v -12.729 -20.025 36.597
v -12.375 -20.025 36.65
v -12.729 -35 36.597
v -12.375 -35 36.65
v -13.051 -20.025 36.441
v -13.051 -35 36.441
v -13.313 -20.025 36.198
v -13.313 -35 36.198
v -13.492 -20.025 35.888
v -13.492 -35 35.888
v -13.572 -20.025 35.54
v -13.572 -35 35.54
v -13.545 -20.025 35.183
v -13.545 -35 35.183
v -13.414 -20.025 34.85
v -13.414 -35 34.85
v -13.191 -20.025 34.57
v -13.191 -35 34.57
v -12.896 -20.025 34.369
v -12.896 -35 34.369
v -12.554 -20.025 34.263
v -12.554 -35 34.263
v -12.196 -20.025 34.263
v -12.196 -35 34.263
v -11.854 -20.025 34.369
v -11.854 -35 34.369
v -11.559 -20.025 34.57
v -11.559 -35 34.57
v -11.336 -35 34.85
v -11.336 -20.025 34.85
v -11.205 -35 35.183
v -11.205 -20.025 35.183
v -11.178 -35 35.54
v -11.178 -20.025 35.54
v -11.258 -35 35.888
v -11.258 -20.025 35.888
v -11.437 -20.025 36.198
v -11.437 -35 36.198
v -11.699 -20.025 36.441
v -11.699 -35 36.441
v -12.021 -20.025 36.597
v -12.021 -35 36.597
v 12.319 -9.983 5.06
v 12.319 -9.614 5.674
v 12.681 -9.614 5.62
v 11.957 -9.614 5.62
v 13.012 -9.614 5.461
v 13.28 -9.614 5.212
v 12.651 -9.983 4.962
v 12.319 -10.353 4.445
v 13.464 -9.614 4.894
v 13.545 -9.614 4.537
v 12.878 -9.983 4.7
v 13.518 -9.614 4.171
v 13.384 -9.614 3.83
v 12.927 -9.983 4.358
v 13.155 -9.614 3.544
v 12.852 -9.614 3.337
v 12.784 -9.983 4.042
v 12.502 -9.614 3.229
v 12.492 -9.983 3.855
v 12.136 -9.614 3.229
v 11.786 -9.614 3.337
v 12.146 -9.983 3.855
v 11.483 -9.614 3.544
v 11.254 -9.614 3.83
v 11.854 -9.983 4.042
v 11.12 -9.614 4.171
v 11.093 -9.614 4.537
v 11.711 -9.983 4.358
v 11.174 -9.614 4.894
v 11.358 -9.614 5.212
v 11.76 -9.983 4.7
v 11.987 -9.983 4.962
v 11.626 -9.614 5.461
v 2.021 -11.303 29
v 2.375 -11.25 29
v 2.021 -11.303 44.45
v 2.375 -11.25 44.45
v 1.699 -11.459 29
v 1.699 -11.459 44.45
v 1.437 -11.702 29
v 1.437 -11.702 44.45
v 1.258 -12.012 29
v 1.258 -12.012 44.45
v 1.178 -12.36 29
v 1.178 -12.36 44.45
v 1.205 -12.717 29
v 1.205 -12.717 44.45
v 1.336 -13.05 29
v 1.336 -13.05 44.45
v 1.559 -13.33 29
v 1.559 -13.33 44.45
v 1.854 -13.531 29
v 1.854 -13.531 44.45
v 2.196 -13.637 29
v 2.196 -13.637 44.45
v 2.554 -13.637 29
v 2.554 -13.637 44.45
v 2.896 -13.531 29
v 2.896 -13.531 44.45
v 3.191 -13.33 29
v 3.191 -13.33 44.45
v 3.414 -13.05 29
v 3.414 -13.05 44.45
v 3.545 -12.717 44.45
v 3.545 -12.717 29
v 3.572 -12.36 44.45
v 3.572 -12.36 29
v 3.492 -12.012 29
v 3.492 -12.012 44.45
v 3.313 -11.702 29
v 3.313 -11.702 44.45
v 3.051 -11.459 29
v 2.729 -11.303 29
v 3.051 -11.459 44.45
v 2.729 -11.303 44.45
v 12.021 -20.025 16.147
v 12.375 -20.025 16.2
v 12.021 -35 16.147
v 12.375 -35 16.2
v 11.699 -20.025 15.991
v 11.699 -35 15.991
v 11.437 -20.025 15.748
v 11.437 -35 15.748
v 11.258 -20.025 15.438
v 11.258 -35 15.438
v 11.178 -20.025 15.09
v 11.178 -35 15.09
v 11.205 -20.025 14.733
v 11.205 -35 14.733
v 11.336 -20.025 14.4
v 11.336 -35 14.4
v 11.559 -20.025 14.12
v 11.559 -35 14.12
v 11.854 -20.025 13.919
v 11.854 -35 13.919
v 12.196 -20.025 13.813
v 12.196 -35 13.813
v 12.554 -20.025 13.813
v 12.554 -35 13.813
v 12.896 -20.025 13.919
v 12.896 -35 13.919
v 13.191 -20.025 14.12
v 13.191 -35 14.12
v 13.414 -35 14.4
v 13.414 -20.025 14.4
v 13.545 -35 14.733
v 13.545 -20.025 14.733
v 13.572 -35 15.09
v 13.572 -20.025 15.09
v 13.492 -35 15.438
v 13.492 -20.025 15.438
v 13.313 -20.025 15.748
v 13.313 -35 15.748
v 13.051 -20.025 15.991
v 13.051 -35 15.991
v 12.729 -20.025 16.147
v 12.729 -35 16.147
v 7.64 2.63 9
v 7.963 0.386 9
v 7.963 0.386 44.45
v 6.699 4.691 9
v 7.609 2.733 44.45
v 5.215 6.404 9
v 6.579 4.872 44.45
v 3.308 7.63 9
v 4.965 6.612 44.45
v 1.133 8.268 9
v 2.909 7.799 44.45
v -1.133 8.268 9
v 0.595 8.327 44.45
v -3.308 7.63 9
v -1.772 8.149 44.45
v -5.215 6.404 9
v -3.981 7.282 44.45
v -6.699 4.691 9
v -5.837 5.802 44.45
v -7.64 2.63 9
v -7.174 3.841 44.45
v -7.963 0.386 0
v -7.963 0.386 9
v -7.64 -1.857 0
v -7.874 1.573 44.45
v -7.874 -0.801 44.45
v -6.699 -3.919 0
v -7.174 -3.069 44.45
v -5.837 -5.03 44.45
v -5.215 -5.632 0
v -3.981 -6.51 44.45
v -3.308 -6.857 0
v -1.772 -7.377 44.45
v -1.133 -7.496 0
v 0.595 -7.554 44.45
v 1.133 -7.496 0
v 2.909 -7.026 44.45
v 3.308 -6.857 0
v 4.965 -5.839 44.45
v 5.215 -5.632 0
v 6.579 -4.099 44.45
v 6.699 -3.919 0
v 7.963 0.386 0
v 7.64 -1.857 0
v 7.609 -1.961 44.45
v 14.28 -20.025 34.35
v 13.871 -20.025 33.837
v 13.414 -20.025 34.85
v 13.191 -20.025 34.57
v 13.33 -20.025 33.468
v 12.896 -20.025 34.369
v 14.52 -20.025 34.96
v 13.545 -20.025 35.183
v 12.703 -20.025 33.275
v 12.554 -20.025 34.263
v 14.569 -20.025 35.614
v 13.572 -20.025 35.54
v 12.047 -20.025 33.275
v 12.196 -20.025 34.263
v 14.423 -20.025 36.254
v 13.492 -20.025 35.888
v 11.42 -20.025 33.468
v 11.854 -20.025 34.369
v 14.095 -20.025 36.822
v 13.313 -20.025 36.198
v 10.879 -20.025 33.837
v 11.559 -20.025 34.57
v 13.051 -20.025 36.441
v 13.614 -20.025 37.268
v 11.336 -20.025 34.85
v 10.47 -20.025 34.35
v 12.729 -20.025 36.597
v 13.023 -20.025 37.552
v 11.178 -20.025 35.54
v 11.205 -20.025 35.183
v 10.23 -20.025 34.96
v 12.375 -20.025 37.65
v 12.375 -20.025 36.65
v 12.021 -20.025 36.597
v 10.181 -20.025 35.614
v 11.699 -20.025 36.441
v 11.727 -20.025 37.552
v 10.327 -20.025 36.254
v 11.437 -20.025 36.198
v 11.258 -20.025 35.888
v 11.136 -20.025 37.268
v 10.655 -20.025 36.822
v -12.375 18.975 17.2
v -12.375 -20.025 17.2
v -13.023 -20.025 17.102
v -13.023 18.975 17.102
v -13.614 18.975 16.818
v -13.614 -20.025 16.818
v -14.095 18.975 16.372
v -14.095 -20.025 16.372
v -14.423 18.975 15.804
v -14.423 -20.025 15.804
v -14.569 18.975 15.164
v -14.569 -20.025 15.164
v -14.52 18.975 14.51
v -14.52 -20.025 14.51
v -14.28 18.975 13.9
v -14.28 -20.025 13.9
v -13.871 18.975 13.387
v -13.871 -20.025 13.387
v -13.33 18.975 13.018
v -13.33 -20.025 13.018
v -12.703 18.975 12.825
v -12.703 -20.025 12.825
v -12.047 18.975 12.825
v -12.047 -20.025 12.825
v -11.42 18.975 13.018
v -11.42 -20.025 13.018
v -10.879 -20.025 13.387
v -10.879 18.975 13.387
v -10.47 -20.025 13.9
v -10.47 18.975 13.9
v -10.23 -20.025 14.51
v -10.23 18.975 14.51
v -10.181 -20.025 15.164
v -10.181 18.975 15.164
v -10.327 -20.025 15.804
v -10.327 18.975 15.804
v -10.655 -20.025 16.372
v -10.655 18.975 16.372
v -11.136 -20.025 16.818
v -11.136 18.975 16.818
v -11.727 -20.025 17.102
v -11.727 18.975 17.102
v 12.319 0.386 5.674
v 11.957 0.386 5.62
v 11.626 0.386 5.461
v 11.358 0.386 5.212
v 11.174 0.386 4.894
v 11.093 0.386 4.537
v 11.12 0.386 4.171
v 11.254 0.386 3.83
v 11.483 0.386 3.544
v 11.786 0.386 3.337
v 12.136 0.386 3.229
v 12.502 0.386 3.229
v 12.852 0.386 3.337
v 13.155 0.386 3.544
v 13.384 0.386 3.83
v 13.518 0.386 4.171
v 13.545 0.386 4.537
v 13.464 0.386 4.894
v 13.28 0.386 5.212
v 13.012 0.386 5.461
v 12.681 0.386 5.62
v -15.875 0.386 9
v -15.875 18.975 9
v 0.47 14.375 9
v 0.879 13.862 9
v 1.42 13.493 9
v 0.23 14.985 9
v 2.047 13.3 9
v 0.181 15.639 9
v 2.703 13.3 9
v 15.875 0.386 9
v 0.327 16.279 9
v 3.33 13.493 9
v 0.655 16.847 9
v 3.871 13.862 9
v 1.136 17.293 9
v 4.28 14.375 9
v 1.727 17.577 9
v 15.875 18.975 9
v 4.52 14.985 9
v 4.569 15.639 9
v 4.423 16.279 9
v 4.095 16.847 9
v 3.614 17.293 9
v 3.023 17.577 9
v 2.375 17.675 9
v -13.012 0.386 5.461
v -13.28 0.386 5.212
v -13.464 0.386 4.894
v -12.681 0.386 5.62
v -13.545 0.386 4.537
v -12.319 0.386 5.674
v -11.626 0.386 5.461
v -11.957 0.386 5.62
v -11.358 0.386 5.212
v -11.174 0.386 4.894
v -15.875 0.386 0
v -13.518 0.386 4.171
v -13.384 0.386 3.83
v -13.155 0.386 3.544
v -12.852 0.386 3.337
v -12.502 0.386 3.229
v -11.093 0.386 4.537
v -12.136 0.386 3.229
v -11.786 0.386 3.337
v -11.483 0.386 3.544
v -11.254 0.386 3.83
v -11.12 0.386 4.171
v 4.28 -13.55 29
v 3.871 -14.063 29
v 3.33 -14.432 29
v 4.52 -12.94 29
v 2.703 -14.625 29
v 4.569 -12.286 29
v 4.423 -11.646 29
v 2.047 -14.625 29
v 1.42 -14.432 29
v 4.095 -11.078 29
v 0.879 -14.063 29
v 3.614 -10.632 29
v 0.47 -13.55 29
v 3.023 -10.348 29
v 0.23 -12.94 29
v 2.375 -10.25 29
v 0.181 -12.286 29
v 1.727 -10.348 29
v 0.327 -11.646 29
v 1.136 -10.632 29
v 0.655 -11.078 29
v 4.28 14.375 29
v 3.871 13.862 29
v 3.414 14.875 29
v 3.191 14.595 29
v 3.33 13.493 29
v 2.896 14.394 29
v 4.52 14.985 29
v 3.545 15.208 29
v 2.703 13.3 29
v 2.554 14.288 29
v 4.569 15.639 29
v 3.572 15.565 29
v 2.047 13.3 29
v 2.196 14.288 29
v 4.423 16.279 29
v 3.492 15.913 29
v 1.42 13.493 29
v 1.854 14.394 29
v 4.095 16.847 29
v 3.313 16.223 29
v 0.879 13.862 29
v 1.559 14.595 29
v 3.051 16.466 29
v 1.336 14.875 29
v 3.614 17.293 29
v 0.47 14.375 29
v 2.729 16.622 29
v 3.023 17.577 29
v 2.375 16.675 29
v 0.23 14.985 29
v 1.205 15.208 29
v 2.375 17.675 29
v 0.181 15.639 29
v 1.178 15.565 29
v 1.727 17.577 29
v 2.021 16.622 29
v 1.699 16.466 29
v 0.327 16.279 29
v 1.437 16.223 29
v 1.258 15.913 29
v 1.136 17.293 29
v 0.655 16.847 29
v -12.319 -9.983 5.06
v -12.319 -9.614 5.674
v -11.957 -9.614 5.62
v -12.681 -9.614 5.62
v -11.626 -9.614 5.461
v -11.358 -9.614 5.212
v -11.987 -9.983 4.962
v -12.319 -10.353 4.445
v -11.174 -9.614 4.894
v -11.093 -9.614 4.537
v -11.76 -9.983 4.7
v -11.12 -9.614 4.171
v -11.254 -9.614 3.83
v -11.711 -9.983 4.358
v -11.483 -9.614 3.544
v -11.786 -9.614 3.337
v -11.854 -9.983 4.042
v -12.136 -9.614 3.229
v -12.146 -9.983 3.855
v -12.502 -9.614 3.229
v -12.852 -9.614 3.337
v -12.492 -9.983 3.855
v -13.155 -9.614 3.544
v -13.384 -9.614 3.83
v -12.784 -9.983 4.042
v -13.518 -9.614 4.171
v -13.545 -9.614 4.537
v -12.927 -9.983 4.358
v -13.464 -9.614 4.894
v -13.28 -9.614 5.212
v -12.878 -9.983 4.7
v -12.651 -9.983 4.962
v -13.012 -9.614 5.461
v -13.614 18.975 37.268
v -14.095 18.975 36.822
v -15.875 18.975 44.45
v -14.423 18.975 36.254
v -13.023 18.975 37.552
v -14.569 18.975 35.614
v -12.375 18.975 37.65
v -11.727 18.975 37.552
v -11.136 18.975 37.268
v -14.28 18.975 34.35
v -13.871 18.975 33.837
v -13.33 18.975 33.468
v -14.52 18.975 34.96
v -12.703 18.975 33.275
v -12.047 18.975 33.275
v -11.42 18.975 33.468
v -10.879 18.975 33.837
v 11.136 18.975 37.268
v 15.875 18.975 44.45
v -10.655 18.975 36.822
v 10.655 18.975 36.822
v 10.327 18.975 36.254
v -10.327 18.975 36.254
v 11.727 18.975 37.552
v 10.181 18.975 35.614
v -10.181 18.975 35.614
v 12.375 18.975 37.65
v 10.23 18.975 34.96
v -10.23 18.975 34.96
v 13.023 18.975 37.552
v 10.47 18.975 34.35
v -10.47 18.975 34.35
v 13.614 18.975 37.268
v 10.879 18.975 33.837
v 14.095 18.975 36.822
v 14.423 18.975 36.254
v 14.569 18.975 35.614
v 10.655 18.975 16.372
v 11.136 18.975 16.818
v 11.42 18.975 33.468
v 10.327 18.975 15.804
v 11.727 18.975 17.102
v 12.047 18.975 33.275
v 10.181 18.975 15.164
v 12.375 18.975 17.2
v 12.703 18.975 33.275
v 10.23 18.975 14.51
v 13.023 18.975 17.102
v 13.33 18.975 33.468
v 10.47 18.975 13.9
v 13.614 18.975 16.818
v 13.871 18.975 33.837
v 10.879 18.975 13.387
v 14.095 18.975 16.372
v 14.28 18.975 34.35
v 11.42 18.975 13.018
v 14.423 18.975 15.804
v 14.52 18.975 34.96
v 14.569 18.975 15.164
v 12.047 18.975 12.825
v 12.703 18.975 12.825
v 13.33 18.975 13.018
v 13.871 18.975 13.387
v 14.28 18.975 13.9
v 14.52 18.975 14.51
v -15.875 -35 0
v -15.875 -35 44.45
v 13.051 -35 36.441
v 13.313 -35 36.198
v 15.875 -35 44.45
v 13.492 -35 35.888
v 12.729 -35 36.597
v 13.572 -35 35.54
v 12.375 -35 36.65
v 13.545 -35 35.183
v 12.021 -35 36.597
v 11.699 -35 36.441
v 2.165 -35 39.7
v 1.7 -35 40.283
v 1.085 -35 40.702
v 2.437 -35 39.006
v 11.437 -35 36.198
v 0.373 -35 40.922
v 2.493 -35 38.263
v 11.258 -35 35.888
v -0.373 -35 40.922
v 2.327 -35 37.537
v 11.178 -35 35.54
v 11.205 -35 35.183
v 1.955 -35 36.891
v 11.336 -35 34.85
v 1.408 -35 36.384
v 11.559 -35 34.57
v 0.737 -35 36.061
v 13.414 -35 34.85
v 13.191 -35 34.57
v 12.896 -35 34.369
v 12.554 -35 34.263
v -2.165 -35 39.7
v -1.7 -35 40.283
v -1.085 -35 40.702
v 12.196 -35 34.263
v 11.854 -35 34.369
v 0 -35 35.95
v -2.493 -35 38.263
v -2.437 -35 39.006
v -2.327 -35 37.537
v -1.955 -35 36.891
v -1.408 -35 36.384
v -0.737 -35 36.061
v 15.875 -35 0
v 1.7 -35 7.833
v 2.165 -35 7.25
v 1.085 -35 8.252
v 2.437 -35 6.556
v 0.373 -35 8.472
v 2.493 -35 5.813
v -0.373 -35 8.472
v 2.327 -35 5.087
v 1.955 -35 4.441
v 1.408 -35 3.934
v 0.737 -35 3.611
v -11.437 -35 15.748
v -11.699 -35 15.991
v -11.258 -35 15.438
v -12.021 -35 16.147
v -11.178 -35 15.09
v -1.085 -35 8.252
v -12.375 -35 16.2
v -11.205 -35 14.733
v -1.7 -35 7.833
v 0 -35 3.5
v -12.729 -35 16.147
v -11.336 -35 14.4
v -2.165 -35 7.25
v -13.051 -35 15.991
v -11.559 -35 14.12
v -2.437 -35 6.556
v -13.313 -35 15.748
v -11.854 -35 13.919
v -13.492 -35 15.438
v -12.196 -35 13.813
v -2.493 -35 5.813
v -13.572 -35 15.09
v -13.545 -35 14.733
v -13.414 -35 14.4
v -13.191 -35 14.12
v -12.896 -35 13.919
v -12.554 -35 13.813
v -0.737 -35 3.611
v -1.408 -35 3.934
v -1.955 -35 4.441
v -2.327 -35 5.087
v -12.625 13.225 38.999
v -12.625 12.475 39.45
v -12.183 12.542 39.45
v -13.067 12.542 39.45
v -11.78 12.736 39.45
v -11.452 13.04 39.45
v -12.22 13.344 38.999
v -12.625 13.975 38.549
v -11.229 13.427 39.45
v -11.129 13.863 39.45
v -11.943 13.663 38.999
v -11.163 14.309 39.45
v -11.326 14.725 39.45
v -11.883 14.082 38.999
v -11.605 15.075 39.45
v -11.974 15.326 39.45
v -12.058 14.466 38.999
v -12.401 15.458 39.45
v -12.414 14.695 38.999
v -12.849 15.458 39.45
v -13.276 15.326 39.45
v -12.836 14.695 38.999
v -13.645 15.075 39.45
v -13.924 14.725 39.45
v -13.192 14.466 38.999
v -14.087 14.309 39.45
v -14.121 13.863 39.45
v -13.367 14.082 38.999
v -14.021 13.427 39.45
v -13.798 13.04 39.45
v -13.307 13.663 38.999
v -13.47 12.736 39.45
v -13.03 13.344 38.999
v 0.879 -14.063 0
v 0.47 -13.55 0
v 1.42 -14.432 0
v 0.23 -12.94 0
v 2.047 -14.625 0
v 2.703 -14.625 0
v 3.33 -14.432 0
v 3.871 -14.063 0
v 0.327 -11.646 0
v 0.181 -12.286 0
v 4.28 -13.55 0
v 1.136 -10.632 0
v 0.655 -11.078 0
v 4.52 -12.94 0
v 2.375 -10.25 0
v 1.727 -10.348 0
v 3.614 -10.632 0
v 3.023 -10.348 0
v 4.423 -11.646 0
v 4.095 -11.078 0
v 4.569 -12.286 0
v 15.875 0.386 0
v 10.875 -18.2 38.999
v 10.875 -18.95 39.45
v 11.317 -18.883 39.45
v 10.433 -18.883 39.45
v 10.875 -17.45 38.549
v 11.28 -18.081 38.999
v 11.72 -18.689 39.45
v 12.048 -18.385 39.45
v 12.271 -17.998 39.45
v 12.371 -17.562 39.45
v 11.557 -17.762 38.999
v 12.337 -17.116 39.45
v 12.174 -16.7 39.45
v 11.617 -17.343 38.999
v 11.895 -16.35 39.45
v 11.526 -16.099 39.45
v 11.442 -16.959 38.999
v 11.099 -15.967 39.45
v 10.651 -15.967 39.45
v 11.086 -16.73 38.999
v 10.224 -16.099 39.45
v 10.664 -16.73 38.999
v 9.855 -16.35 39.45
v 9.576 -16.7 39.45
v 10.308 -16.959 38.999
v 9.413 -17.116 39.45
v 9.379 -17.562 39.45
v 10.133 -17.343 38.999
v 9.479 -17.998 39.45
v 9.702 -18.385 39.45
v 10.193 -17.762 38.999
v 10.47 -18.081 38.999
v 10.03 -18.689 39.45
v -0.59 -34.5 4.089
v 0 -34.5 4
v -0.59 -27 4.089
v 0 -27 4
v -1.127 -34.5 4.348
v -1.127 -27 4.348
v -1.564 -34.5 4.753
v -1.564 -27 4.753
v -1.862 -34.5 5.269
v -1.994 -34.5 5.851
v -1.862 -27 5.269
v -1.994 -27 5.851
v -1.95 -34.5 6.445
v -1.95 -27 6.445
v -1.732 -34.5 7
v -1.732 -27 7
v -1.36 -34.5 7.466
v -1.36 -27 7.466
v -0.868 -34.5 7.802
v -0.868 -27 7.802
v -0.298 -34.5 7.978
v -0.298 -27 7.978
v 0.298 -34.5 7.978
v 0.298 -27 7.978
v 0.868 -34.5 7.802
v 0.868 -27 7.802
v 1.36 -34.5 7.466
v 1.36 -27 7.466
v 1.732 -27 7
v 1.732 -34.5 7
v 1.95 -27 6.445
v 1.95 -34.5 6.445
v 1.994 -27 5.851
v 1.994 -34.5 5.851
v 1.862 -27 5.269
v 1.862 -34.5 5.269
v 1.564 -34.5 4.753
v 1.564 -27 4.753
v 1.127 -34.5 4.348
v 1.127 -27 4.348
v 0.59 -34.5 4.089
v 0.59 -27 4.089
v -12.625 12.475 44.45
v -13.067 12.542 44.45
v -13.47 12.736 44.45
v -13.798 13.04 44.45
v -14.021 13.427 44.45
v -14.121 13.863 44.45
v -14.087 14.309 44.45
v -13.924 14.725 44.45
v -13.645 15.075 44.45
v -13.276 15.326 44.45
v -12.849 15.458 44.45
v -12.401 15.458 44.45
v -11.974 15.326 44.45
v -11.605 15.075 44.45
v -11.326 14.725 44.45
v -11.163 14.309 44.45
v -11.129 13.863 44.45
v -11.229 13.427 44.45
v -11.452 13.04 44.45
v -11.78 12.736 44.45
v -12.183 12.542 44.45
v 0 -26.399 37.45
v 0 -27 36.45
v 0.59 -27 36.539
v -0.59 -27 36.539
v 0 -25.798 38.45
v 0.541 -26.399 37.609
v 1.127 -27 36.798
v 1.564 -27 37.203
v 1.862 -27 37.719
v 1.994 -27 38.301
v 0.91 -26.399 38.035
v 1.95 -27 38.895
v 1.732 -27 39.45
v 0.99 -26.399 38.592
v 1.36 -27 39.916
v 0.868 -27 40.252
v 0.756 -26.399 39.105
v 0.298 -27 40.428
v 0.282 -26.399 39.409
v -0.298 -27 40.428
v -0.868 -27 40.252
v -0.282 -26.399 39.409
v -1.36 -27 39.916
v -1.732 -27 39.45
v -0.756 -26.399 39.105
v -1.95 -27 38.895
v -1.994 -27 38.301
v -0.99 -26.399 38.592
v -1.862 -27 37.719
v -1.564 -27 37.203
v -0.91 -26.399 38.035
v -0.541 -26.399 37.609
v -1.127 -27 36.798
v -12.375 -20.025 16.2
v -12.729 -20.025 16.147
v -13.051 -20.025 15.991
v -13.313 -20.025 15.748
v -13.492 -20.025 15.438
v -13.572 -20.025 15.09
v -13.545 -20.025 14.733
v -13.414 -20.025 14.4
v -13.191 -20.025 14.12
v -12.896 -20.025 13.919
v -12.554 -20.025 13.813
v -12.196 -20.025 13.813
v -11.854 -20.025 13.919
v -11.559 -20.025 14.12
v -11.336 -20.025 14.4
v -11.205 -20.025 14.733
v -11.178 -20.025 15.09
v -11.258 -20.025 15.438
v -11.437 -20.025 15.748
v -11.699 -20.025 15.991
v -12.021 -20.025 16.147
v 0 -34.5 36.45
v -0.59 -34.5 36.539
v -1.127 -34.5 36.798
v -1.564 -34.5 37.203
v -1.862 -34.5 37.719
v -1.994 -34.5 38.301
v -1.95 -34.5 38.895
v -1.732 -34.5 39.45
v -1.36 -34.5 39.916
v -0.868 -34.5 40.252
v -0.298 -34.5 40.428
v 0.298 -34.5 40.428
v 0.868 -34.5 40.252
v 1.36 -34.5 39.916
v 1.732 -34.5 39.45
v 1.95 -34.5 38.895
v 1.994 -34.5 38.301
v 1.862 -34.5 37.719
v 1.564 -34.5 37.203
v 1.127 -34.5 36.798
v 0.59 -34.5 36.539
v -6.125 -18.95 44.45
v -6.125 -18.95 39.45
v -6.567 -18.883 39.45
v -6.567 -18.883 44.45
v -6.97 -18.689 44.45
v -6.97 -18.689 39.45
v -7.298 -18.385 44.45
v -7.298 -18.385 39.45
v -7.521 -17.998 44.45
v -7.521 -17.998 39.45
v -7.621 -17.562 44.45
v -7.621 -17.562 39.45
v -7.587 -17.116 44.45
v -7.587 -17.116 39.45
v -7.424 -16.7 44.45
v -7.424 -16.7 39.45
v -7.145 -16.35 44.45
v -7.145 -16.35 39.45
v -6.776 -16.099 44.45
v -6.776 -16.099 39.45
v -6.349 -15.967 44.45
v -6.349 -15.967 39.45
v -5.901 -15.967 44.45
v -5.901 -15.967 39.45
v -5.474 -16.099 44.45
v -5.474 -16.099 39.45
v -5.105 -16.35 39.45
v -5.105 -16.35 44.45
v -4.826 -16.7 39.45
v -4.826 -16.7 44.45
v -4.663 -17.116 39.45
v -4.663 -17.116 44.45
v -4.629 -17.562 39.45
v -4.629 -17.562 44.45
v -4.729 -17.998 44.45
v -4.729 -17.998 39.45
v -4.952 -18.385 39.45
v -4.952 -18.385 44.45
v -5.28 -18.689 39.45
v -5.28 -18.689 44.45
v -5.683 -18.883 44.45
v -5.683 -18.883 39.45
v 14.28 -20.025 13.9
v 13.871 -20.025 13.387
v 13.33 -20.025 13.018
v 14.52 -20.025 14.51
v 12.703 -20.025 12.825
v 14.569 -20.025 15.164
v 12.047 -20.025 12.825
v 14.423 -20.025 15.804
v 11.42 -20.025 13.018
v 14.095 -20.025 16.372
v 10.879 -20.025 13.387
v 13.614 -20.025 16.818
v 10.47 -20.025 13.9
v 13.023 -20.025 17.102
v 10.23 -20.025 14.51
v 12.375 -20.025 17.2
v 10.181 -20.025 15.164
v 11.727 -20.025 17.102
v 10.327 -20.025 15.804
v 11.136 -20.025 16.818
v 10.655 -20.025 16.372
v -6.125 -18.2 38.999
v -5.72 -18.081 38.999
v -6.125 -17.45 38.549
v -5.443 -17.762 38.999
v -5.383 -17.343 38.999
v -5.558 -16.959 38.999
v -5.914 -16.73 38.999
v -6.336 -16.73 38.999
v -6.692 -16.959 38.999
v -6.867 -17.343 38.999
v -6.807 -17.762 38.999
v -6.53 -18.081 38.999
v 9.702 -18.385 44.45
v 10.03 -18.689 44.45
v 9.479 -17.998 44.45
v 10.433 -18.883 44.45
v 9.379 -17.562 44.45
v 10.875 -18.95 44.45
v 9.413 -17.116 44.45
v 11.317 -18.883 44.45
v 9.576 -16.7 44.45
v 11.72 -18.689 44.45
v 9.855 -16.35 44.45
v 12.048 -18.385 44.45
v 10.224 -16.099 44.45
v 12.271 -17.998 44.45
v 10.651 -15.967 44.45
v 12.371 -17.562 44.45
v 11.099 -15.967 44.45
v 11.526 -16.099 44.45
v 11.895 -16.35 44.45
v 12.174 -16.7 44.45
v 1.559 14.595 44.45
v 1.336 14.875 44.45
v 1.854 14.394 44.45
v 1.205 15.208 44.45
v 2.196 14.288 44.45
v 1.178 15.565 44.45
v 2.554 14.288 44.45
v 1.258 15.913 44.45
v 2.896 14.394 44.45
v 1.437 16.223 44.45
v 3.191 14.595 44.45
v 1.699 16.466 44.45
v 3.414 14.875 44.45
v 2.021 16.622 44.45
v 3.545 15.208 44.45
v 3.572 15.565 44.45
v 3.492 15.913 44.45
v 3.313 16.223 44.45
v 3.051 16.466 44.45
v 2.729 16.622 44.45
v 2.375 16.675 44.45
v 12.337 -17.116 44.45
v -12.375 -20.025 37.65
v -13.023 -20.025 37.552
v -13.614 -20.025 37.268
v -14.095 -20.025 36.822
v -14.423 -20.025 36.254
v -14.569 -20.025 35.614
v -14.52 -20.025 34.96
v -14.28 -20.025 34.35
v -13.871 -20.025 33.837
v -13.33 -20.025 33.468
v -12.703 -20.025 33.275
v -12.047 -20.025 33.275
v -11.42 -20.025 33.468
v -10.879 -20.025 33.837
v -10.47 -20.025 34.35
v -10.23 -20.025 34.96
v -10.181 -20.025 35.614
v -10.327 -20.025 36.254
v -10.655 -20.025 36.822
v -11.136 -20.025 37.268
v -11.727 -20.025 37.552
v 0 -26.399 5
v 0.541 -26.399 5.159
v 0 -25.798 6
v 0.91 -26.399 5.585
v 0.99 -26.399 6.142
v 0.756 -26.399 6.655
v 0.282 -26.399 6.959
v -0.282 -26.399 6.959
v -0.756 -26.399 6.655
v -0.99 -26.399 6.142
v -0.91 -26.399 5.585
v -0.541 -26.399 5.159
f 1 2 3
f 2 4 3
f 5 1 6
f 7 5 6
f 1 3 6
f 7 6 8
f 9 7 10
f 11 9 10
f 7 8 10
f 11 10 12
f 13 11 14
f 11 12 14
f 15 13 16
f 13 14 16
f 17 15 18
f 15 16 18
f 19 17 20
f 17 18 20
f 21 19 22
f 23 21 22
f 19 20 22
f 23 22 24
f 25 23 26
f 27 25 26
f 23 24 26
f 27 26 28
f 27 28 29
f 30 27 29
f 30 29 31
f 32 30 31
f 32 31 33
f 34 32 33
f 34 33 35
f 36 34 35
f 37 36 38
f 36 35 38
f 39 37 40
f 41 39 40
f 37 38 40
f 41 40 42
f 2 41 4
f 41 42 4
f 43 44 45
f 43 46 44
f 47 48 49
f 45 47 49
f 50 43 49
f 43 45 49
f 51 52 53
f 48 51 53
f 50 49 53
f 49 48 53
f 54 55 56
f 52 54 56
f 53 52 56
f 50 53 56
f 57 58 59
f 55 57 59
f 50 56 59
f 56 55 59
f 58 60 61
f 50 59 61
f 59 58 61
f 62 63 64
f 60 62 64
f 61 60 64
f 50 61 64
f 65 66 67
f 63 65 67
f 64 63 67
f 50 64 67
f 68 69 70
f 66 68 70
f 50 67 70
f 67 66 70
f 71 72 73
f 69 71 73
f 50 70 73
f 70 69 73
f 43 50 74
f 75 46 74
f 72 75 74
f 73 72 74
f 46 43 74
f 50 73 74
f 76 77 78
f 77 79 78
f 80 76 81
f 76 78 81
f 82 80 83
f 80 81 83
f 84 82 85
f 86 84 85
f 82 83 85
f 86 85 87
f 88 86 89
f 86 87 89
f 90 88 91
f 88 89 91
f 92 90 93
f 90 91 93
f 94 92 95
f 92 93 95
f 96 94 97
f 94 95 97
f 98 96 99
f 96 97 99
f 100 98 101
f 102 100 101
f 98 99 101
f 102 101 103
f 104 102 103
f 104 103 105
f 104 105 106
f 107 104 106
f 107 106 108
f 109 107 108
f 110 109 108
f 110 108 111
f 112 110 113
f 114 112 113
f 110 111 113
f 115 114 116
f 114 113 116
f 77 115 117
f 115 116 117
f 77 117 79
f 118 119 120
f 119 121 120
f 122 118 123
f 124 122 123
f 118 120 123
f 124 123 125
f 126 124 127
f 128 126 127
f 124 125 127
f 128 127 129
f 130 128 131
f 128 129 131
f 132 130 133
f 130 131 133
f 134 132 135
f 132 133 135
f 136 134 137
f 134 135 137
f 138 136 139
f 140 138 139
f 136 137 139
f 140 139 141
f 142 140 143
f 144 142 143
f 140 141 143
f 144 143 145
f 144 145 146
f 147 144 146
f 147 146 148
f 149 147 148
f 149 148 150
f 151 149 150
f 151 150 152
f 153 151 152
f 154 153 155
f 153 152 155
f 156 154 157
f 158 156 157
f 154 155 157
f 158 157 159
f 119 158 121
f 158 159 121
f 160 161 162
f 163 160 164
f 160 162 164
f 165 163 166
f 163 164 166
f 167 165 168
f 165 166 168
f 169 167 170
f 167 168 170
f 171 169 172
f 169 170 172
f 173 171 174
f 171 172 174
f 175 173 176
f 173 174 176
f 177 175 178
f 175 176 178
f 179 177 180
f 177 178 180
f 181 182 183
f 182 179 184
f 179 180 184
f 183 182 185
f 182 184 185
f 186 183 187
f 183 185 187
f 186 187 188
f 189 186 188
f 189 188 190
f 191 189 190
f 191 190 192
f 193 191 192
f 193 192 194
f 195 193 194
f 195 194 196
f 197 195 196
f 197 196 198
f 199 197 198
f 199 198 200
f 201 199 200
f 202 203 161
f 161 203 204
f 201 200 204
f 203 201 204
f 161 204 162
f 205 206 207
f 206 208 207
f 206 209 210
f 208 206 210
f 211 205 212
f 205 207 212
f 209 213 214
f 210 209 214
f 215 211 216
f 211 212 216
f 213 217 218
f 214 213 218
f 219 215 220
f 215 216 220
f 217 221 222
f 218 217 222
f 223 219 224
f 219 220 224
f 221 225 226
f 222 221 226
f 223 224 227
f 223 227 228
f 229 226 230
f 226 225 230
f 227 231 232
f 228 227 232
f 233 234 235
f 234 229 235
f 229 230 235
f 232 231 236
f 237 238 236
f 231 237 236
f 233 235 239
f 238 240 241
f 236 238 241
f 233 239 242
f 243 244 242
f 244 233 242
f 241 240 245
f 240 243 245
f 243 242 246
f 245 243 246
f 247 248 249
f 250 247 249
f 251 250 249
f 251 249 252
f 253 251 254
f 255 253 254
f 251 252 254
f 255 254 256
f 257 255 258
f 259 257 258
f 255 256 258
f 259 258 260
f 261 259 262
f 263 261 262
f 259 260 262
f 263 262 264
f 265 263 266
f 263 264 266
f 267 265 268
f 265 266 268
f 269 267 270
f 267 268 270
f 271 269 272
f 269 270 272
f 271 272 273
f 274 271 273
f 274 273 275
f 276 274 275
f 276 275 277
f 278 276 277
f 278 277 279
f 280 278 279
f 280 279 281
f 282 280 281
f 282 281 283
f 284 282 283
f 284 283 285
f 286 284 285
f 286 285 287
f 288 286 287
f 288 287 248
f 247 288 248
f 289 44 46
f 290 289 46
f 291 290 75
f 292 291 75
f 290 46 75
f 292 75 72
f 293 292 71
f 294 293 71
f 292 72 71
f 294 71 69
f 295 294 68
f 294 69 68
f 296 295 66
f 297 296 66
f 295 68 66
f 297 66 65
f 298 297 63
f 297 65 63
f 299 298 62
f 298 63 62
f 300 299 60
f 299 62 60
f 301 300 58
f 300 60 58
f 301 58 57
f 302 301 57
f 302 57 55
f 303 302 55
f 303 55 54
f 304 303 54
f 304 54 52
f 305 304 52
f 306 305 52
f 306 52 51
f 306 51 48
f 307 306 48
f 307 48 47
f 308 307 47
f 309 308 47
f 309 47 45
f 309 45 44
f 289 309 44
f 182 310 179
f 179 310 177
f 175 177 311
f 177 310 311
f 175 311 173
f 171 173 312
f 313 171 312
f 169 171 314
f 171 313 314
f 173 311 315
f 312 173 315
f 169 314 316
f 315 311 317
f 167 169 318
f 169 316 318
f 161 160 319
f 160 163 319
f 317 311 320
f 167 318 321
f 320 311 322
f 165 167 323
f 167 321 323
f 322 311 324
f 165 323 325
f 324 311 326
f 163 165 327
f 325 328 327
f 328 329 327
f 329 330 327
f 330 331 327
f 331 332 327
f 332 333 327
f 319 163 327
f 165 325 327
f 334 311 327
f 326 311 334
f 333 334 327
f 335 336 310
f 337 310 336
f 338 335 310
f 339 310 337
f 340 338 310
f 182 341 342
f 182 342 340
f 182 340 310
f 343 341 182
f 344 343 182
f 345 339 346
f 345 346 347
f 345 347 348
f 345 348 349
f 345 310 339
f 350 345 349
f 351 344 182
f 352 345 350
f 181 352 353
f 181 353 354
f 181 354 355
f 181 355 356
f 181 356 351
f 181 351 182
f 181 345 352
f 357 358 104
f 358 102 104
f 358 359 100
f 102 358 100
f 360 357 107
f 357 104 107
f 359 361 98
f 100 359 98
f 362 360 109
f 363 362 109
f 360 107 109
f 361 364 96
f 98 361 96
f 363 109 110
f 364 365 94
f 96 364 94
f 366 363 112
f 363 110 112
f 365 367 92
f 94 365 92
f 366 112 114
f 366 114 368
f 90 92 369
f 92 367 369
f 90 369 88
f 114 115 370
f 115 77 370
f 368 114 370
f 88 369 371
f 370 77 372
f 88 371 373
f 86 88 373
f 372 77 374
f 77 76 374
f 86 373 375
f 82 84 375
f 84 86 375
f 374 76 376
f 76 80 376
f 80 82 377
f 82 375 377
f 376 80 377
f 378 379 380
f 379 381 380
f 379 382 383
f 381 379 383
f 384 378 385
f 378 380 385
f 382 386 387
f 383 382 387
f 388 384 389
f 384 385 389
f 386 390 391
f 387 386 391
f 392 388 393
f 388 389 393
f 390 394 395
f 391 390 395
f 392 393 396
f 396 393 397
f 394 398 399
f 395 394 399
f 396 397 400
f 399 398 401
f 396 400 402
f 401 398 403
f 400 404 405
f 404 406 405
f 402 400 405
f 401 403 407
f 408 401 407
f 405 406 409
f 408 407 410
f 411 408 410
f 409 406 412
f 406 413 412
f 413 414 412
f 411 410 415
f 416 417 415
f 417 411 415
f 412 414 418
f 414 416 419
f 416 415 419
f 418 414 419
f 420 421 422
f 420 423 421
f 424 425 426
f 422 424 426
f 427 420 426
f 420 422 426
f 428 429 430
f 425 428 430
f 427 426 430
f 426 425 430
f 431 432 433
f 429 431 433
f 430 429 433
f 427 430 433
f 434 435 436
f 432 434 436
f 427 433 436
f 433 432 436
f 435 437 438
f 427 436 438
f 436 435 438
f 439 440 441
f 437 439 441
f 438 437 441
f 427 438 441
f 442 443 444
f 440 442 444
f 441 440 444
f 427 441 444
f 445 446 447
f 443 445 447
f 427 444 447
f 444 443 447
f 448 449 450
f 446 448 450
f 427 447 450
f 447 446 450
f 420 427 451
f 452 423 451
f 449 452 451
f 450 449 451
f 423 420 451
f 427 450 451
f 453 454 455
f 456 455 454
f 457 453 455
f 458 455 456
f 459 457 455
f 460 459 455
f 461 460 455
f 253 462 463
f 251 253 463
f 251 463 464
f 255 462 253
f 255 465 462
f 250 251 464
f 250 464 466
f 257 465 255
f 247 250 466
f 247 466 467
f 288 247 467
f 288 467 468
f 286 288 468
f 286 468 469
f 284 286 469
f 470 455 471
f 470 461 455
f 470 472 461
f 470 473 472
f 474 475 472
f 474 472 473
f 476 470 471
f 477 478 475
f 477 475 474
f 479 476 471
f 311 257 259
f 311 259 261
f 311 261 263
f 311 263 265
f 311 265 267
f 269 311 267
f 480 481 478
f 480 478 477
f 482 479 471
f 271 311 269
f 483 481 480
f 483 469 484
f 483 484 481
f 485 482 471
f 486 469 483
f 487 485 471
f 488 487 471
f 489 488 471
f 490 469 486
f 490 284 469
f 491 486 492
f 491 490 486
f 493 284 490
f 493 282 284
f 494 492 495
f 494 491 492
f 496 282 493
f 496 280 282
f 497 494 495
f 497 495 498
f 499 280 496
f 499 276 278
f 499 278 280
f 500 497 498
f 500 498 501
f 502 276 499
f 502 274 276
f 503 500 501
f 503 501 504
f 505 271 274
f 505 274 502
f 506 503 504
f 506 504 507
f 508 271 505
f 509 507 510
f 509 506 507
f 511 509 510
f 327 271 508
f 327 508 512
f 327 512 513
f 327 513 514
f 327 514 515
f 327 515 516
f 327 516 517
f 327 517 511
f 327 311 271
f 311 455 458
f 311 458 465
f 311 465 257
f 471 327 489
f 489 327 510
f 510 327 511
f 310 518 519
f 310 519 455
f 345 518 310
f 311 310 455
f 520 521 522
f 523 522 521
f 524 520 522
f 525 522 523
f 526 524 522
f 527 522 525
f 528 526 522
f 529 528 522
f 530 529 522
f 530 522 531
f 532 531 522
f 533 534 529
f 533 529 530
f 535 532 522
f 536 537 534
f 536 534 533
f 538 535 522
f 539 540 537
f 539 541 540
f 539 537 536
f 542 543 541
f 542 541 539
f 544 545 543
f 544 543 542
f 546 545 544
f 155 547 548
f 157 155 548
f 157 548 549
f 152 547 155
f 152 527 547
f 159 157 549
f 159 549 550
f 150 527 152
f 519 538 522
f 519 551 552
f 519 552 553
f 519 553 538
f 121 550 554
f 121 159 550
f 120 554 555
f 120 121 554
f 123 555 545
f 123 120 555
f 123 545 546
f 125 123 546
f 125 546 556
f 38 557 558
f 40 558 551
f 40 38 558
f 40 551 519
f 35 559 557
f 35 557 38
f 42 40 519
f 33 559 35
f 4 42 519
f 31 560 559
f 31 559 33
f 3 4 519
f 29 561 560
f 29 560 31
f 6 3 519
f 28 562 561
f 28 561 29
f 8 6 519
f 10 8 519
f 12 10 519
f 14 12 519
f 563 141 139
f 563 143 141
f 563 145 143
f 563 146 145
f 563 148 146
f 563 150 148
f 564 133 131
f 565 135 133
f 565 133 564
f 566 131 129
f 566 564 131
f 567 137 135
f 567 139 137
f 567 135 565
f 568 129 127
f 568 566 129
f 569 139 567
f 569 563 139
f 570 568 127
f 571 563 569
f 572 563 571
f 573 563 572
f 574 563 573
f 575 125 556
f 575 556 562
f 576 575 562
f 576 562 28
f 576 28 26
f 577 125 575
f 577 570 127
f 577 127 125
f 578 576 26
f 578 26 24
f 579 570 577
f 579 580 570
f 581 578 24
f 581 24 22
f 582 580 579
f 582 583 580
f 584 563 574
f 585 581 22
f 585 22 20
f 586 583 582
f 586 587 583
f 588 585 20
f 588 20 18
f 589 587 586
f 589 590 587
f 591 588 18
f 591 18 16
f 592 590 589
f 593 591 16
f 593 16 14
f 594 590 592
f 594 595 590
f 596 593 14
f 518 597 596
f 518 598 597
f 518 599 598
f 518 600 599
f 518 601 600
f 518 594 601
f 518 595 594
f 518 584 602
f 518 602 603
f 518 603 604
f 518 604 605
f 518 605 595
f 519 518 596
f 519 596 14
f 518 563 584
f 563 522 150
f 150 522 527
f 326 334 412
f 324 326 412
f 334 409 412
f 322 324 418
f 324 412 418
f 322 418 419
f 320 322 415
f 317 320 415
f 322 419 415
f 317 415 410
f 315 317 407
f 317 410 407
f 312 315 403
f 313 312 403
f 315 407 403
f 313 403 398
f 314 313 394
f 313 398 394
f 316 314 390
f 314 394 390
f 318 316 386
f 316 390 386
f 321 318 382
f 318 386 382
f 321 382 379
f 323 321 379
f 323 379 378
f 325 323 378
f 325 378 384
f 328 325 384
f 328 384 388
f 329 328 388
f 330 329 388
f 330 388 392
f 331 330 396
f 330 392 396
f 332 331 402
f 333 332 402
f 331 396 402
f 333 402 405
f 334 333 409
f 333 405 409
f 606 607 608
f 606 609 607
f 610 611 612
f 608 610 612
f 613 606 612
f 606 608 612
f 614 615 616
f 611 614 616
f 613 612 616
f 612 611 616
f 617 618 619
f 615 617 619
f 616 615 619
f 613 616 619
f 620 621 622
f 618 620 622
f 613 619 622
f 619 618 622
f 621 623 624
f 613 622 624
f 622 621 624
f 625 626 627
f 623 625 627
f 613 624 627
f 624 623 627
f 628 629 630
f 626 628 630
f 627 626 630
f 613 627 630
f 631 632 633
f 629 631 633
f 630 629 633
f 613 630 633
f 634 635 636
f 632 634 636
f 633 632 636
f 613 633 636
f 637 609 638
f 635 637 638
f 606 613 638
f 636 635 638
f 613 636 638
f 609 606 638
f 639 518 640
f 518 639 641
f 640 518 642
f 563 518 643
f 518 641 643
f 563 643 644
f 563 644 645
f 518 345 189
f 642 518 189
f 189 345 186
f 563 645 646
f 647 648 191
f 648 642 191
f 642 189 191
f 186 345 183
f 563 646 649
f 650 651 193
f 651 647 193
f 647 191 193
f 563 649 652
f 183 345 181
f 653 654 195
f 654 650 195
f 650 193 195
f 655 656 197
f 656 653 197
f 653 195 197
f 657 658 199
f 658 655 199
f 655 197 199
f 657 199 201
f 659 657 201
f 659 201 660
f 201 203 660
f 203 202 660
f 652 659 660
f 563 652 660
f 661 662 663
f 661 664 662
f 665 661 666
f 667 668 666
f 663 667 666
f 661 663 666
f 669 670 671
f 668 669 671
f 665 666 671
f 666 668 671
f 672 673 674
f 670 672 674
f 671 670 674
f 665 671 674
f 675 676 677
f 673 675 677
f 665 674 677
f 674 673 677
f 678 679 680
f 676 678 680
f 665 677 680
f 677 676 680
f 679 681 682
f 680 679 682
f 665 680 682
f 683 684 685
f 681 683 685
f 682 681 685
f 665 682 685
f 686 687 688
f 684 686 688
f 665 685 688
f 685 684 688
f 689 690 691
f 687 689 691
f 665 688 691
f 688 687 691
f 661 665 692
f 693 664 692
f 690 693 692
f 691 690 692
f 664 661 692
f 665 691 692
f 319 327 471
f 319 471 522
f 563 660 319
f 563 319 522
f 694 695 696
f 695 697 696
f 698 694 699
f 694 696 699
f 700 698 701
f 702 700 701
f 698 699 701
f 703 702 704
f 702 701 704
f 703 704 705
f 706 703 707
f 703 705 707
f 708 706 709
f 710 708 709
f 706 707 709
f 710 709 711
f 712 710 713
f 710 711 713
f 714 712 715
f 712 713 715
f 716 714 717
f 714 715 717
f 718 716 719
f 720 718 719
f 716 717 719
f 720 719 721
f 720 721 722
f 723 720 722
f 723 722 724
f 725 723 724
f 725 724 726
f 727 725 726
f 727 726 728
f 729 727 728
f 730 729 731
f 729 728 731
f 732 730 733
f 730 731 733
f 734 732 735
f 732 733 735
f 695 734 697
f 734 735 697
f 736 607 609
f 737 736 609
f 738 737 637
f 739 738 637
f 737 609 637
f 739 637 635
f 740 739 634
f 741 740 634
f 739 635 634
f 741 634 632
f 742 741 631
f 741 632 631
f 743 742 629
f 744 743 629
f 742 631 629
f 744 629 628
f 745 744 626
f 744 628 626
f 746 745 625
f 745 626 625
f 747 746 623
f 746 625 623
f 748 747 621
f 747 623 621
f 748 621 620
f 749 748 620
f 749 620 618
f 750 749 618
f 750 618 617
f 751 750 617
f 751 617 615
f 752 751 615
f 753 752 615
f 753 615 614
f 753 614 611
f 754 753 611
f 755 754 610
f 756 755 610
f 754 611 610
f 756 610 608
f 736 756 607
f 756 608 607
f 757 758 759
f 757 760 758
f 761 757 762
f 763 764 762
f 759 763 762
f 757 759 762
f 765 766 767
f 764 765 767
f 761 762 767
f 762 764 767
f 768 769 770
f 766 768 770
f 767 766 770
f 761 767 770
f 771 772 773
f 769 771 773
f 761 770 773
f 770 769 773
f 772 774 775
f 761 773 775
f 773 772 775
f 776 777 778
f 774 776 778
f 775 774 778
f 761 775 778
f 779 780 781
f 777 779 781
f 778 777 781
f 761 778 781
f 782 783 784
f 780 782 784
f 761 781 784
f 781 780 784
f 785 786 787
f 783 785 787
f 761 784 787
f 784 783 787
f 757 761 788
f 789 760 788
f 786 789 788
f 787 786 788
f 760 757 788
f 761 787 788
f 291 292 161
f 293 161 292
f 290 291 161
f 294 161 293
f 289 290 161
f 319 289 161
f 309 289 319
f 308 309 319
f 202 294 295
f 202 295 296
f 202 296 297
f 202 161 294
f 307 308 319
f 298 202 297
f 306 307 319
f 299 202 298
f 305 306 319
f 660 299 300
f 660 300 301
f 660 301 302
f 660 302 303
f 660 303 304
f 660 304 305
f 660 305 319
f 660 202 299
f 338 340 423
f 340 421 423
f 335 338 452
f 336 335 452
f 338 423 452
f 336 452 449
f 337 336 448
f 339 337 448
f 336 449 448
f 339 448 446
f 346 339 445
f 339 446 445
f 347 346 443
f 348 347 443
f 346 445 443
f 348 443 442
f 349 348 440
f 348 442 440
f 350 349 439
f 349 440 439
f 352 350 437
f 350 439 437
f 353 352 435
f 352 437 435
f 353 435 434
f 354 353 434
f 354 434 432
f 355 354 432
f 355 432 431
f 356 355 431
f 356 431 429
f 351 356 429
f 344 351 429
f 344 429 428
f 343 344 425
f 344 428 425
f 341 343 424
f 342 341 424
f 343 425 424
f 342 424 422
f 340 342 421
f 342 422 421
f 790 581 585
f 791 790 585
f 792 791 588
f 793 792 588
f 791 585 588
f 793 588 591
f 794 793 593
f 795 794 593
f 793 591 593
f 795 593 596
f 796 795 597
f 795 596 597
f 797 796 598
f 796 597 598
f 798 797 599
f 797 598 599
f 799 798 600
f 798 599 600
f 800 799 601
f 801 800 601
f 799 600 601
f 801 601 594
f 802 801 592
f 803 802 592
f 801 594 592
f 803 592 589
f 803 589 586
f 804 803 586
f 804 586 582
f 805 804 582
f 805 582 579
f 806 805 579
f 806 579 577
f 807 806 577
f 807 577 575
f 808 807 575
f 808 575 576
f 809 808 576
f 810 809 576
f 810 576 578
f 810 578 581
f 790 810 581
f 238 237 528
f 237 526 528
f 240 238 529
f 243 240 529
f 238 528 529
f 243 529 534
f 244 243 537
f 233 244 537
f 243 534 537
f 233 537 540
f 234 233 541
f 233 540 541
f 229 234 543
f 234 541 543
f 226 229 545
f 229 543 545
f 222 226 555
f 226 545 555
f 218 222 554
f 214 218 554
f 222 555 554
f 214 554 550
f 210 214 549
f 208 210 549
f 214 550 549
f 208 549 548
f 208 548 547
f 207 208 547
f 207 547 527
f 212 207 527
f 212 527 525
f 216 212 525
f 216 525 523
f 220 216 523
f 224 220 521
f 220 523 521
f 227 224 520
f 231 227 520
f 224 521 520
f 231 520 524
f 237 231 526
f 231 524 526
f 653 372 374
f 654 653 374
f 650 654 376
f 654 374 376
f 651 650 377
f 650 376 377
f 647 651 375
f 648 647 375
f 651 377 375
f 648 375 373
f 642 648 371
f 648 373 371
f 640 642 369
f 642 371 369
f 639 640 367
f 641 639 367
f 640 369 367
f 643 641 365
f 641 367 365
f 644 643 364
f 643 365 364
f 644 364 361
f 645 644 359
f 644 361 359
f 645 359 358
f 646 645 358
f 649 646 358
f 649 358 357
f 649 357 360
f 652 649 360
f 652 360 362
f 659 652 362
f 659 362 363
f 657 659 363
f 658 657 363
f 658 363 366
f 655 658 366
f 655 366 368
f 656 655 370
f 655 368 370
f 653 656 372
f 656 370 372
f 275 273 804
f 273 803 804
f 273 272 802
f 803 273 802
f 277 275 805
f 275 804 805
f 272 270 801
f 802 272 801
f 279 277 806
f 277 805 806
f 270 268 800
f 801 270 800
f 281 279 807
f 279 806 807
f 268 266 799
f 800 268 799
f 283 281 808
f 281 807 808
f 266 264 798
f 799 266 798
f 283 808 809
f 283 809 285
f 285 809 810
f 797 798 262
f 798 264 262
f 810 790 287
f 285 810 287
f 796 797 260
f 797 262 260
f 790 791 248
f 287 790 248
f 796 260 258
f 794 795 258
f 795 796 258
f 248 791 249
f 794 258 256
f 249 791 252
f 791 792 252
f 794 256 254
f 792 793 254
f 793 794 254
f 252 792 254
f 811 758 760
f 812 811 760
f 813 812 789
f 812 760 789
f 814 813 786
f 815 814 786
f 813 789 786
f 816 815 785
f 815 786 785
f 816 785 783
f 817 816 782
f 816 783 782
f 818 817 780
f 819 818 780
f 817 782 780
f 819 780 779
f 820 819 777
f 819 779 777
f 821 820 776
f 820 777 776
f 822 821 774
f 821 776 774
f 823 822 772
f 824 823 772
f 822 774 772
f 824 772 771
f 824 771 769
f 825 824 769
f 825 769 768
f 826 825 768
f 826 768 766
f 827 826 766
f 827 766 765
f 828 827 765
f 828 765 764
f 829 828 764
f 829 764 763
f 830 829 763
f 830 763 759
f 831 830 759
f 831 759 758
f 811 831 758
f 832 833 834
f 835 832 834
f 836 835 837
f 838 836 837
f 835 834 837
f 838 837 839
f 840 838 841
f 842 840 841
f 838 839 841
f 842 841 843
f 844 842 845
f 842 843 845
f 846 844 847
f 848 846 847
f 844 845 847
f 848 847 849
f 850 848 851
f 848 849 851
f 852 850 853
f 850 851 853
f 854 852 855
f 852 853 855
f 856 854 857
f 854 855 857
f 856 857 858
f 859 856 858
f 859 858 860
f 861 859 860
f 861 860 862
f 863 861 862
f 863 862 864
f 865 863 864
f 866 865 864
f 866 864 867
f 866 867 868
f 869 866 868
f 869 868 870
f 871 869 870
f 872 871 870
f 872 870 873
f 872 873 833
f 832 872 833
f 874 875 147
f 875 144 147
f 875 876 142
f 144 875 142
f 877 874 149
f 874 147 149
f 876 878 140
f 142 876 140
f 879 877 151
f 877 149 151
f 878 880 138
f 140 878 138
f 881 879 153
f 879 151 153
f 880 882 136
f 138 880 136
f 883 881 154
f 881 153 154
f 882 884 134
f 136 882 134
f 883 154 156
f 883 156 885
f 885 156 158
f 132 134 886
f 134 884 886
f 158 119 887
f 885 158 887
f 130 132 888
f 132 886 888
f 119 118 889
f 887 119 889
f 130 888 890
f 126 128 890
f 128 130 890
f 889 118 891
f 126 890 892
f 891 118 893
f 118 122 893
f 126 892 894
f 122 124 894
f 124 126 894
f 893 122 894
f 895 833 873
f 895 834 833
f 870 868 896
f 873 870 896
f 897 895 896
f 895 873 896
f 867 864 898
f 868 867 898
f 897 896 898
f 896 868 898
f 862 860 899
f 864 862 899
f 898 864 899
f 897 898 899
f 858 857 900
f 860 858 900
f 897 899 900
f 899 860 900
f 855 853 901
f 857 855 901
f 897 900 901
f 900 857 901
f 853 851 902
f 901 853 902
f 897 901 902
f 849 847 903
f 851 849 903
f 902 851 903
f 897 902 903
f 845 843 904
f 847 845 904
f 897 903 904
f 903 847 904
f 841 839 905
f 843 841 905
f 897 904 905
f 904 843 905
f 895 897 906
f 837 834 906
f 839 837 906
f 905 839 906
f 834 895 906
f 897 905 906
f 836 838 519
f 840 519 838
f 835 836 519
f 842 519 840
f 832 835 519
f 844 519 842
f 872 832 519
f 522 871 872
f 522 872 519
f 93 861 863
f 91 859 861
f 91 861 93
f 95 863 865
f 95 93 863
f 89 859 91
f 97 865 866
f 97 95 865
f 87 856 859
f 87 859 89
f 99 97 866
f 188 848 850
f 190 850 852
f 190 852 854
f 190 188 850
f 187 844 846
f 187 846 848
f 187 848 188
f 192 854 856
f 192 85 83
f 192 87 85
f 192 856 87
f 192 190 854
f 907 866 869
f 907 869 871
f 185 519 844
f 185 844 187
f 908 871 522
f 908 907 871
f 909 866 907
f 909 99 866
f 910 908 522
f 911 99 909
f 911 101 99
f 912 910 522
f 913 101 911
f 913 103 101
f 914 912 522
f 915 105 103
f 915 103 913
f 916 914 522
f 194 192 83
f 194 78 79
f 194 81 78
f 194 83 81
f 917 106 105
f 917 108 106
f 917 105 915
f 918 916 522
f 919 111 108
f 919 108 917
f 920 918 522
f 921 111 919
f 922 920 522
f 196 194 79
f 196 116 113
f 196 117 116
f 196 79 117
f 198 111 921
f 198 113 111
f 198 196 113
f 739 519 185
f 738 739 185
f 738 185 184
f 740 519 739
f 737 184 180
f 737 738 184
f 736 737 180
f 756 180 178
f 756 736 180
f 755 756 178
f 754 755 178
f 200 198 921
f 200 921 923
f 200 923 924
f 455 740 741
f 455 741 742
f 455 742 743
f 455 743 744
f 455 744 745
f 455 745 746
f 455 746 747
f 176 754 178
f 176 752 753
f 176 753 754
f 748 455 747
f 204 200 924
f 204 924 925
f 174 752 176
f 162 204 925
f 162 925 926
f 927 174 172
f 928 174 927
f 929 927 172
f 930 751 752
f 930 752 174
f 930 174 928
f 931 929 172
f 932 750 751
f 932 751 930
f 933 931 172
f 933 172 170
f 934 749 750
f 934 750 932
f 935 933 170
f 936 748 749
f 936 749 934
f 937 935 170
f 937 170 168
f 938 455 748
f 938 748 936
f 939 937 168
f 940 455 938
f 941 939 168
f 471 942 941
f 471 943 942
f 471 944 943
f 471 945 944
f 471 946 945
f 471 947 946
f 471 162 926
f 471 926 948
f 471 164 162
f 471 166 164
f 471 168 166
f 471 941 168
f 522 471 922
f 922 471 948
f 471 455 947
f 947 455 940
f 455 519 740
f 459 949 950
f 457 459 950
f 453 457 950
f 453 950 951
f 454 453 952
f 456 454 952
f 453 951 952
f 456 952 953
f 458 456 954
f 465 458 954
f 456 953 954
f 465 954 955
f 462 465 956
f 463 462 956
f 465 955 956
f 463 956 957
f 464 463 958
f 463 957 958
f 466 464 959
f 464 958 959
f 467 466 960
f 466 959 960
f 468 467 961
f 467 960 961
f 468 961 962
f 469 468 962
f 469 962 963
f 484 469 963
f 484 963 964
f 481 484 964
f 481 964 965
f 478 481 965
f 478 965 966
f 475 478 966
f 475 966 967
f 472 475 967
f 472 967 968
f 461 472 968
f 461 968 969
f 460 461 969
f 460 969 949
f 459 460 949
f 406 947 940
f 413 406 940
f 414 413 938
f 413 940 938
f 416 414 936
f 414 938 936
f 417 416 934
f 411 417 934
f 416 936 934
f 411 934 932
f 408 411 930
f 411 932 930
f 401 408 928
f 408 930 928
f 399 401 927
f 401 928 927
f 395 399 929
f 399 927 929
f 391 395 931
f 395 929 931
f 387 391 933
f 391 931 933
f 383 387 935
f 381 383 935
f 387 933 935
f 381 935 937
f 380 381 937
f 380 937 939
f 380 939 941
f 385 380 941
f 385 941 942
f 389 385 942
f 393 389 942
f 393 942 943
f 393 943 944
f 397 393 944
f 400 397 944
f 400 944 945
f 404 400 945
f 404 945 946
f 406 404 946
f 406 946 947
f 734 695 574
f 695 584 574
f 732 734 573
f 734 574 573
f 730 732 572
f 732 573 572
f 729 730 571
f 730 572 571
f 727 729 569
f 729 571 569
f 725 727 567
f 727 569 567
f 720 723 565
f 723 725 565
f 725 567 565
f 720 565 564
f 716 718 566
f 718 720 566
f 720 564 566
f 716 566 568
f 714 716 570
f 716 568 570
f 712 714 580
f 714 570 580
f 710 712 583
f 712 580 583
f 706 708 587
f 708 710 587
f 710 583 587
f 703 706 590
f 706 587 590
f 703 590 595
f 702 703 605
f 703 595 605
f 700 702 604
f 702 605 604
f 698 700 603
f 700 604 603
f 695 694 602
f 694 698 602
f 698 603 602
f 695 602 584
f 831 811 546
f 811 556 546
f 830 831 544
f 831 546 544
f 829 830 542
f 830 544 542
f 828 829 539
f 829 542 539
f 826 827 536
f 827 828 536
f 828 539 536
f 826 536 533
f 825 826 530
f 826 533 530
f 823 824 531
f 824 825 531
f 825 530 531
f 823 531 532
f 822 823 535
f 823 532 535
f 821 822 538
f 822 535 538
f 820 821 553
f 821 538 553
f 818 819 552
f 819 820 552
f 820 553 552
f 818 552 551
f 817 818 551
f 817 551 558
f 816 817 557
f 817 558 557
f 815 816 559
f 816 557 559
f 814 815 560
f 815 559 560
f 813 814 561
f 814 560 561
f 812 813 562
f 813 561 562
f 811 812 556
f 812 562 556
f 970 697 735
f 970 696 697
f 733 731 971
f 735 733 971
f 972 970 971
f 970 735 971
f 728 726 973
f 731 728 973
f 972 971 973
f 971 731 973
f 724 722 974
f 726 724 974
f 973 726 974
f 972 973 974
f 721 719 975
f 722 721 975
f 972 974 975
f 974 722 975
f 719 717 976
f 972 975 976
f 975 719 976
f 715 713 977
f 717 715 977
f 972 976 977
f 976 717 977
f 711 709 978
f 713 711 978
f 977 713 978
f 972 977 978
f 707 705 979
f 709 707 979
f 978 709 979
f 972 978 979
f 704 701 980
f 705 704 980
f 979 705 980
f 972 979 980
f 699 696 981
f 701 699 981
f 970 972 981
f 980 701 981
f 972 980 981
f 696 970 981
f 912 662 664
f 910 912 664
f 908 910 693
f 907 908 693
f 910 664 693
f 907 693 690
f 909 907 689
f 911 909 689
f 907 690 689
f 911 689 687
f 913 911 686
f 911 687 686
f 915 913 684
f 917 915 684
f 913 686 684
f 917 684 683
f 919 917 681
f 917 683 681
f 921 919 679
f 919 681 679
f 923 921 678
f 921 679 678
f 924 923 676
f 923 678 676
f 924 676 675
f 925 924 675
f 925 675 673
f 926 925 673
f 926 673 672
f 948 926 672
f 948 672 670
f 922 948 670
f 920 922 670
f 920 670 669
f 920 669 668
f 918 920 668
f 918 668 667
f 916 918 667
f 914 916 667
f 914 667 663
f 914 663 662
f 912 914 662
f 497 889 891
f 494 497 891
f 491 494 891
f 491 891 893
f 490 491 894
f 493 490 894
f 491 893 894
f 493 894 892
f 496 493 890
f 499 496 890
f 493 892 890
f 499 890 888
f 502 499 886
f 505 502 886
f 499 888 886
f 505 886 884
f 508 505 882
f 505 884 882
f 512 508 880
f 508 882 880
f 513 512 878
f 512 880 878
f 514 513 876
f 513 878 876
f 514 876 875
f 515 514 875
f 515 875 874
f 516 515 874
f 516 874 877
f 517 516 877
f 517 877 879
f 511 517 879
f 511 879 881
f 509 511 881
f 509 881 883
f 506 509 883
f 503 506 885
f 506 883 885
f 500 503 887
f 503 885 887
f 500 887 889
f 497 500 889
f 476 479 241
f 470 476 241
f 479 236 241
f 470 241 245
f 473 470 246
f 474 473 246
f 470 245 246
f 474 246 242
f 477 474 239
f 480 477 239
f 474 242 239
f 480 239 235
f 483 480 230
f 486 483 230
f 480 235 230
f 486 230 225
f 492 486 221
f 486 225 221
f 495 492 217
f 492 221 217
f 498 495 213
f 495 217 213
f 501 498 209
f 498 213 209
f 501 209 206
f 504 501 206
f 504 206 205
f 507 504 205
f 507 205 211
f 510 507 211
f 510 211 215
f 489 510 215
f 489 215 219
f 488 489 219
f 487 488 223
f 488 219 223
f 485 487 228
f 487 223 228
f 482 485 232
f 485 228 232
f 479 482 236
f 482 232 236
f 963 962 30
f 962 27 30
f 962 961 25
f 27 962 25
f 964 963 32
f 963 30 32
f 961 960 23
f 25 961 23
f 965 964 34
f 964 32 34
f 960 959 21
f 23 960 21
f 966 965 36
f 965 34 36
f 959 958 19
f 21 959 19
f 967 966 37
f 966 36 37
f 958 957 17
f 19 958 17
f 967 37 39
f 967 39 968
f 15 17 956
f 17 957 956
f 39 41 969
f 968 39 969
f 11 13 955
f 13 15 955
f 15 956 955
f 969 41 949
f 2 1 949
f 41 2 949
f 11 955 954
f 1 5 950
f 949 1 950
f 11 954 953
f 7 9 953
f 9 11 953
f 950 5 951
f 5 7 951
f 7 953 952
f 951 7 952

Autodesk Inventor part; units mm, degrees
ref_plane "YZ Plane" through (0, 0, 0) normal (1, 0, 0) x (0, 1, 0)
ref_plane "XZ Plane" through (0, 0, 0) normal (0, 1, 0) x (-1, 0, 0)
ref_plane "XY Plane" through (0, 0, 0) normal (0, 0, 1) x (1, 0, 0)
sketch "Sketch1" plane through (0, 0, 0) normal (0, 0, 1) x (1, 0, 0)
  line L0 (-15.875, 18.975) -> (15.875, 18.975)
  line L1 (15.875, 18.975) -> (15.875, -35)
  line L2 (15.875, -35) -> (-15.875, -35)
  line L3 (-15.875, -35) -> (-15.875, 18.975)
  point P0 (0, 0)
  dimension "d0" = 31.75
  dimension "d1" = 53.975
  dimension "d3" = 35
  dimension "d4" = 15.875
extrude "Extrusion1" add sketch "Sketch1" along normal blind 44.45
sketch "Sketch2" plane through (0, 0, 44.45) normal (0, 0, 1) x (1, 0, 0)
  circle A0 centre (0, 0.3862) radius 7.9629
  line L0 (15.875, 18.975) -> (-15.875, 18.975)
  line L1 (-15.875, 18.975) -> (-15.875, -35)
  line L2 (-15.875, -35) -> (15.875, -35)
  line L3 (15.875, -35) -> (15.875, 18.975)
  line L4 (15.875, 18.975) -> (-15.875, 18.975)
  line L5 (0, 18.975) -> (0, -35) construction
  dimension "d7" = 15.9258
  dimension "d124" = 35.3862
extrude "Extrusion2" cut sketch "Sketch2" against normal through all contours A0
sketch "Sketch4" plane through (-15.875, 18.975, 0) normal (0, 1, 0) x (1, 0, 0)
  line L0 (0, 0) -> (31.75, 0)
  line L1 (31.75, 0) -> (0, 0)
  line L2 (0, 0) -> (0, -9)
  line L3 (0, -9) -> (31.75, -9)
  line L4 (31.75, -9) -> (31.75, 0)
  line L5 (0, 0) -> (0, -44.45)
  point P0 (15.875, 0)
  point P1 (0, -4.5)
  dimension "d15" = 9
extrude "Extrusion4" cut sketch "Sketch4" against normal blind 18.5888
sketch "Sketch6" plane through (0, 0, 44.45) normal (0, 0, 1) x (1, 0, 0)
  line L0 (15.875, -15.95) -> (-11.125, -15.95)
  line L1 (-11.125, -15.95) -> (-11.125, 18.975)
  point P0 (0, 0)
  point P1 (-6.125, -17.45)
  point P2 (10.875, -17.45)
  point P3 (-12.625, 13.975)
  dimension "d33" = 1.5
  dimension "d34" = 1.5
  dimension "d35" = 5
  dimension "d36" = 5
  dimension "d44" = 5
  dimension "d45" = 1.5
hole "Press fit for D3mm_L10mm Dowel - pin to protrude 5mm" at (-6.125, -17.45, 44.45) at (10.875, -17.45, 44.45) at (-12.625, 13.975, 44.45) direction (0, 0, -1) diameter 3 depth 5 tip angle 118
sketch "Sketch9" plane through (-15.875, 18.975, 44.45) normal (0, 1, 0) x (1, 0, 0)
  line L0 (31.75, 35.45) -> (0, 35.45)
  line L1 (0, 35.45) -> (0, 0)
  line L2 (31.75, 0) -> (0, 0)
  line L3 (31.75, 35.45) -> (31.75, 0)
  line L4 (23.8379, 35.45) -> (23.8379, 44.45)
  line L5 (7.9121, 44.45) -> (23.8379, 44.45)
  line L6 (7.9121, 44.45) -> (7.9121, 35.45)
  line L7 (7.9121, 35.45) -> (23.8379, 35.45)
  line L8 (23.8379, 0) -> (7.9121, 0)
  point P0 (15.875, 44.45)
  point P1 (28.25, 9)
  point P2 (3.5, 9)
  point P3 (3.5, 29.45)
  point P4 (28.25, 29.45)
  dimension "d60" = 9
  dimension "d61" = 3.5
  dimension "d62" = 3.5
  dimension "d63" = 9
  dimension "d96" = 6
  dimension "d97" = 6
  dimension "d98" = 3.5
  dimension "d99" = 3.5
hole "Cbore hole for M2 screw_1" at (12.375, 18.975, 35.45) at (-12.375, 18.975, 35.45) at (-12.375, 18.975, 15) at (12.375, 18.975, 15) direction (0, -1, 0) diameter 2.4 end through all counterbore diameter 4.4 counterbore depth 39
sketch "Sketch11" plane through (15.875, 18.975, 9) normal (0, 0, -1) x (-1, 0, 0)
  circle A0 centre (13.5, -3.5) radius 0.7835
  point P0 (15.875, -18.975)
hole "Cbore hole for M2 screw_2" at (2.375, 15.475, 9) direction (0, 0, 1) diameter 2.4 end through all counterbore diameter 4.4 counterbore depth 20
sketch "Sketch12" plane through (0, 0, 0) normal (0, 0, -1) x (-1, 0, 0)
  circle A0 centre (-2.375, -12.45) radius 0.7835
  point P0 (0, 0)
hole "Cbore hole for M2 screw_3" at (2.375, -12.45, 0) direction (0, 0, 1) diameter 2.4 end through all counterbore diameter 4.4 counterbore depth 29
sketch "Sketch13" plane through (-15.875, -35, 0) normal (0, -1, 0) x (1, 0, 0)
  circle A0 centre (3.5, 15) radius 1.2
  circle A1 centre (28.25, 35.45) radius 1.2
  circle A2 centre (3.5, 35.45) radius 1.2
  circle A3 centre (28.25, 15) radius 1.2
  line L0 (31.75, 0) -> (0, 0)
  line L1 (31.75, 0) -> (31.75, 44.45)
  line L2 (0, 44.45) -> (31.75, 44.45)
  line L3 (0, 0) -> (0, 44.45)
  line L4 (0, 44.45) -> (31.75, 44.45)
  line L5 (20.45, 0) -> (16.05, 0)
  line L6 (15.875, 44.45) -> (15.875, 0) construction
  point P0 (15.875, 0)
  point P1 (15.875, 38.45)
  point P2 (15.875, 6)
  dimension "d100" = 6
  dimension "d101" = 6
hole "Locating Holes for Mitsumi CJPDB3-4" at (0, -35, 38.45) at (0, -35, 6) direction (0, 1, 0) diameter 4 depth 8 tip angle 118 countersink diameter 5 countersink angle 90
sketch "Sketch15" plane through (-15.875, 0.3862, 0) normal (0, 1, 0) x (1, 0, 0)
  circle A0 centre (3.556, -4.445) radius 1.7
  circle A1 centre (28.194, -4.445) radius 1.7
  point P0 (15.875, 0)
hole "Threaded hole for M3 screw" at (12.319, 0.3862, 4.445) at (-12.319, 0.3862, 4.445) direction (0, -1, 0) diameter 2.459 depth 10 tip angle 118
equation "\"d4\" = 0.5 * d0"
properties part number "J007515" material "ALUMINUM, 6061-T651"
